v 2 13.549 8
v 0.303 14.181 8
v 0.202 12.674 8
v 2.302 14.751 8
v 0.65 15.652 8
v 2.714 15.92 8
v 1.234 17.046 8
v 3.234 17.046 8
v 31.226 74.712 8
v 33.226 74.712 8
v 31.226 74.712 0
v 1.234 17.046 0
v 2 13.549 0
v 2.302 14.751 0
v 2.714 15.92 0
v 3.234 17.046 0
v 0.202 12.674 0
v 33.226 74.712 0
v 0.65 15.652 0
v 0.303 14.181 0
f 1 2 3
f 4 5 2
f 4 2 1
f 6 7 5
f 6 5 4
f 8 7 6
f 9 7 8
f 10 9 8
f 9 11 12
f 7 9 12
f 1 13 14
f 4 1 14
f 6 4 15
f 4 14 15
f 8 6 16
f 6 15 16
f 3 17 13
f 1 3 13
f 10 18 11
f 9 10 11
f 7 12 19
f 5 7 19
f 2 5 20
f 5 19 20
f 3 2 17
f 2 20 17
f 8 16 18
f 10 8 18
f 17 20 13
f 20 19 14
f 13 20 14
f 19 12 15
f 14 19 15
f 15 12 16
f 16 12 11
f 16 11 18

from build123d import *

# Parameters (mm, degrees)
F1_DEPTH = 6
F2_DEPTH = 8


with BuildPart() as f1:
    # F0 (on Top) → F1 (new body)
    with BuildSketch(Plane.XY):
        Polygon((31.226261, 74.712449), (1.234041, 17.045589), (3.234041, 17.045589), (33.226261, 74.712449), align=None)
        with BuildLine():
            Line((3.234041, 17.045589), (1.234041, 17.045589))
            ThreePointArc((1.234041, 17.045589), (0.445743, 14.923822), (0.201795, 12.673533))
            Line((0.201795, 12.673533), (2, 13.549008))
            ThreePointArc((2, 13.549008), (2.494165, 15.340658), (3.234041, 17.045589))
        make_face()
    extrude(amount=F1_DEPTH)

    # F0 (on Top) → F2 (join)
    with BuildSketch(Plane.XY):
        Polygon((31.226261, 74.712449), (1.234041, 17.045589), (3.234041, 17.045589), (33.226261, 74.712449), align=None)
        with BuildLine():
            Line((3.234041, 17.045589), (1.234041, 17.045589))
            ThreePointArc((1.234041, 17.045589), (0.445743, 14.923822), (0.201795, 12.673533))
            Line((0.201795, 12.673533), (2, 13.549008))
            ThreePointArc((2, 13.549008), (2.494165, 15.340658), (3.234041, 17.045589))
        make_face()
    extrude(amount=F2_DEPTH)


solid = f1.part
